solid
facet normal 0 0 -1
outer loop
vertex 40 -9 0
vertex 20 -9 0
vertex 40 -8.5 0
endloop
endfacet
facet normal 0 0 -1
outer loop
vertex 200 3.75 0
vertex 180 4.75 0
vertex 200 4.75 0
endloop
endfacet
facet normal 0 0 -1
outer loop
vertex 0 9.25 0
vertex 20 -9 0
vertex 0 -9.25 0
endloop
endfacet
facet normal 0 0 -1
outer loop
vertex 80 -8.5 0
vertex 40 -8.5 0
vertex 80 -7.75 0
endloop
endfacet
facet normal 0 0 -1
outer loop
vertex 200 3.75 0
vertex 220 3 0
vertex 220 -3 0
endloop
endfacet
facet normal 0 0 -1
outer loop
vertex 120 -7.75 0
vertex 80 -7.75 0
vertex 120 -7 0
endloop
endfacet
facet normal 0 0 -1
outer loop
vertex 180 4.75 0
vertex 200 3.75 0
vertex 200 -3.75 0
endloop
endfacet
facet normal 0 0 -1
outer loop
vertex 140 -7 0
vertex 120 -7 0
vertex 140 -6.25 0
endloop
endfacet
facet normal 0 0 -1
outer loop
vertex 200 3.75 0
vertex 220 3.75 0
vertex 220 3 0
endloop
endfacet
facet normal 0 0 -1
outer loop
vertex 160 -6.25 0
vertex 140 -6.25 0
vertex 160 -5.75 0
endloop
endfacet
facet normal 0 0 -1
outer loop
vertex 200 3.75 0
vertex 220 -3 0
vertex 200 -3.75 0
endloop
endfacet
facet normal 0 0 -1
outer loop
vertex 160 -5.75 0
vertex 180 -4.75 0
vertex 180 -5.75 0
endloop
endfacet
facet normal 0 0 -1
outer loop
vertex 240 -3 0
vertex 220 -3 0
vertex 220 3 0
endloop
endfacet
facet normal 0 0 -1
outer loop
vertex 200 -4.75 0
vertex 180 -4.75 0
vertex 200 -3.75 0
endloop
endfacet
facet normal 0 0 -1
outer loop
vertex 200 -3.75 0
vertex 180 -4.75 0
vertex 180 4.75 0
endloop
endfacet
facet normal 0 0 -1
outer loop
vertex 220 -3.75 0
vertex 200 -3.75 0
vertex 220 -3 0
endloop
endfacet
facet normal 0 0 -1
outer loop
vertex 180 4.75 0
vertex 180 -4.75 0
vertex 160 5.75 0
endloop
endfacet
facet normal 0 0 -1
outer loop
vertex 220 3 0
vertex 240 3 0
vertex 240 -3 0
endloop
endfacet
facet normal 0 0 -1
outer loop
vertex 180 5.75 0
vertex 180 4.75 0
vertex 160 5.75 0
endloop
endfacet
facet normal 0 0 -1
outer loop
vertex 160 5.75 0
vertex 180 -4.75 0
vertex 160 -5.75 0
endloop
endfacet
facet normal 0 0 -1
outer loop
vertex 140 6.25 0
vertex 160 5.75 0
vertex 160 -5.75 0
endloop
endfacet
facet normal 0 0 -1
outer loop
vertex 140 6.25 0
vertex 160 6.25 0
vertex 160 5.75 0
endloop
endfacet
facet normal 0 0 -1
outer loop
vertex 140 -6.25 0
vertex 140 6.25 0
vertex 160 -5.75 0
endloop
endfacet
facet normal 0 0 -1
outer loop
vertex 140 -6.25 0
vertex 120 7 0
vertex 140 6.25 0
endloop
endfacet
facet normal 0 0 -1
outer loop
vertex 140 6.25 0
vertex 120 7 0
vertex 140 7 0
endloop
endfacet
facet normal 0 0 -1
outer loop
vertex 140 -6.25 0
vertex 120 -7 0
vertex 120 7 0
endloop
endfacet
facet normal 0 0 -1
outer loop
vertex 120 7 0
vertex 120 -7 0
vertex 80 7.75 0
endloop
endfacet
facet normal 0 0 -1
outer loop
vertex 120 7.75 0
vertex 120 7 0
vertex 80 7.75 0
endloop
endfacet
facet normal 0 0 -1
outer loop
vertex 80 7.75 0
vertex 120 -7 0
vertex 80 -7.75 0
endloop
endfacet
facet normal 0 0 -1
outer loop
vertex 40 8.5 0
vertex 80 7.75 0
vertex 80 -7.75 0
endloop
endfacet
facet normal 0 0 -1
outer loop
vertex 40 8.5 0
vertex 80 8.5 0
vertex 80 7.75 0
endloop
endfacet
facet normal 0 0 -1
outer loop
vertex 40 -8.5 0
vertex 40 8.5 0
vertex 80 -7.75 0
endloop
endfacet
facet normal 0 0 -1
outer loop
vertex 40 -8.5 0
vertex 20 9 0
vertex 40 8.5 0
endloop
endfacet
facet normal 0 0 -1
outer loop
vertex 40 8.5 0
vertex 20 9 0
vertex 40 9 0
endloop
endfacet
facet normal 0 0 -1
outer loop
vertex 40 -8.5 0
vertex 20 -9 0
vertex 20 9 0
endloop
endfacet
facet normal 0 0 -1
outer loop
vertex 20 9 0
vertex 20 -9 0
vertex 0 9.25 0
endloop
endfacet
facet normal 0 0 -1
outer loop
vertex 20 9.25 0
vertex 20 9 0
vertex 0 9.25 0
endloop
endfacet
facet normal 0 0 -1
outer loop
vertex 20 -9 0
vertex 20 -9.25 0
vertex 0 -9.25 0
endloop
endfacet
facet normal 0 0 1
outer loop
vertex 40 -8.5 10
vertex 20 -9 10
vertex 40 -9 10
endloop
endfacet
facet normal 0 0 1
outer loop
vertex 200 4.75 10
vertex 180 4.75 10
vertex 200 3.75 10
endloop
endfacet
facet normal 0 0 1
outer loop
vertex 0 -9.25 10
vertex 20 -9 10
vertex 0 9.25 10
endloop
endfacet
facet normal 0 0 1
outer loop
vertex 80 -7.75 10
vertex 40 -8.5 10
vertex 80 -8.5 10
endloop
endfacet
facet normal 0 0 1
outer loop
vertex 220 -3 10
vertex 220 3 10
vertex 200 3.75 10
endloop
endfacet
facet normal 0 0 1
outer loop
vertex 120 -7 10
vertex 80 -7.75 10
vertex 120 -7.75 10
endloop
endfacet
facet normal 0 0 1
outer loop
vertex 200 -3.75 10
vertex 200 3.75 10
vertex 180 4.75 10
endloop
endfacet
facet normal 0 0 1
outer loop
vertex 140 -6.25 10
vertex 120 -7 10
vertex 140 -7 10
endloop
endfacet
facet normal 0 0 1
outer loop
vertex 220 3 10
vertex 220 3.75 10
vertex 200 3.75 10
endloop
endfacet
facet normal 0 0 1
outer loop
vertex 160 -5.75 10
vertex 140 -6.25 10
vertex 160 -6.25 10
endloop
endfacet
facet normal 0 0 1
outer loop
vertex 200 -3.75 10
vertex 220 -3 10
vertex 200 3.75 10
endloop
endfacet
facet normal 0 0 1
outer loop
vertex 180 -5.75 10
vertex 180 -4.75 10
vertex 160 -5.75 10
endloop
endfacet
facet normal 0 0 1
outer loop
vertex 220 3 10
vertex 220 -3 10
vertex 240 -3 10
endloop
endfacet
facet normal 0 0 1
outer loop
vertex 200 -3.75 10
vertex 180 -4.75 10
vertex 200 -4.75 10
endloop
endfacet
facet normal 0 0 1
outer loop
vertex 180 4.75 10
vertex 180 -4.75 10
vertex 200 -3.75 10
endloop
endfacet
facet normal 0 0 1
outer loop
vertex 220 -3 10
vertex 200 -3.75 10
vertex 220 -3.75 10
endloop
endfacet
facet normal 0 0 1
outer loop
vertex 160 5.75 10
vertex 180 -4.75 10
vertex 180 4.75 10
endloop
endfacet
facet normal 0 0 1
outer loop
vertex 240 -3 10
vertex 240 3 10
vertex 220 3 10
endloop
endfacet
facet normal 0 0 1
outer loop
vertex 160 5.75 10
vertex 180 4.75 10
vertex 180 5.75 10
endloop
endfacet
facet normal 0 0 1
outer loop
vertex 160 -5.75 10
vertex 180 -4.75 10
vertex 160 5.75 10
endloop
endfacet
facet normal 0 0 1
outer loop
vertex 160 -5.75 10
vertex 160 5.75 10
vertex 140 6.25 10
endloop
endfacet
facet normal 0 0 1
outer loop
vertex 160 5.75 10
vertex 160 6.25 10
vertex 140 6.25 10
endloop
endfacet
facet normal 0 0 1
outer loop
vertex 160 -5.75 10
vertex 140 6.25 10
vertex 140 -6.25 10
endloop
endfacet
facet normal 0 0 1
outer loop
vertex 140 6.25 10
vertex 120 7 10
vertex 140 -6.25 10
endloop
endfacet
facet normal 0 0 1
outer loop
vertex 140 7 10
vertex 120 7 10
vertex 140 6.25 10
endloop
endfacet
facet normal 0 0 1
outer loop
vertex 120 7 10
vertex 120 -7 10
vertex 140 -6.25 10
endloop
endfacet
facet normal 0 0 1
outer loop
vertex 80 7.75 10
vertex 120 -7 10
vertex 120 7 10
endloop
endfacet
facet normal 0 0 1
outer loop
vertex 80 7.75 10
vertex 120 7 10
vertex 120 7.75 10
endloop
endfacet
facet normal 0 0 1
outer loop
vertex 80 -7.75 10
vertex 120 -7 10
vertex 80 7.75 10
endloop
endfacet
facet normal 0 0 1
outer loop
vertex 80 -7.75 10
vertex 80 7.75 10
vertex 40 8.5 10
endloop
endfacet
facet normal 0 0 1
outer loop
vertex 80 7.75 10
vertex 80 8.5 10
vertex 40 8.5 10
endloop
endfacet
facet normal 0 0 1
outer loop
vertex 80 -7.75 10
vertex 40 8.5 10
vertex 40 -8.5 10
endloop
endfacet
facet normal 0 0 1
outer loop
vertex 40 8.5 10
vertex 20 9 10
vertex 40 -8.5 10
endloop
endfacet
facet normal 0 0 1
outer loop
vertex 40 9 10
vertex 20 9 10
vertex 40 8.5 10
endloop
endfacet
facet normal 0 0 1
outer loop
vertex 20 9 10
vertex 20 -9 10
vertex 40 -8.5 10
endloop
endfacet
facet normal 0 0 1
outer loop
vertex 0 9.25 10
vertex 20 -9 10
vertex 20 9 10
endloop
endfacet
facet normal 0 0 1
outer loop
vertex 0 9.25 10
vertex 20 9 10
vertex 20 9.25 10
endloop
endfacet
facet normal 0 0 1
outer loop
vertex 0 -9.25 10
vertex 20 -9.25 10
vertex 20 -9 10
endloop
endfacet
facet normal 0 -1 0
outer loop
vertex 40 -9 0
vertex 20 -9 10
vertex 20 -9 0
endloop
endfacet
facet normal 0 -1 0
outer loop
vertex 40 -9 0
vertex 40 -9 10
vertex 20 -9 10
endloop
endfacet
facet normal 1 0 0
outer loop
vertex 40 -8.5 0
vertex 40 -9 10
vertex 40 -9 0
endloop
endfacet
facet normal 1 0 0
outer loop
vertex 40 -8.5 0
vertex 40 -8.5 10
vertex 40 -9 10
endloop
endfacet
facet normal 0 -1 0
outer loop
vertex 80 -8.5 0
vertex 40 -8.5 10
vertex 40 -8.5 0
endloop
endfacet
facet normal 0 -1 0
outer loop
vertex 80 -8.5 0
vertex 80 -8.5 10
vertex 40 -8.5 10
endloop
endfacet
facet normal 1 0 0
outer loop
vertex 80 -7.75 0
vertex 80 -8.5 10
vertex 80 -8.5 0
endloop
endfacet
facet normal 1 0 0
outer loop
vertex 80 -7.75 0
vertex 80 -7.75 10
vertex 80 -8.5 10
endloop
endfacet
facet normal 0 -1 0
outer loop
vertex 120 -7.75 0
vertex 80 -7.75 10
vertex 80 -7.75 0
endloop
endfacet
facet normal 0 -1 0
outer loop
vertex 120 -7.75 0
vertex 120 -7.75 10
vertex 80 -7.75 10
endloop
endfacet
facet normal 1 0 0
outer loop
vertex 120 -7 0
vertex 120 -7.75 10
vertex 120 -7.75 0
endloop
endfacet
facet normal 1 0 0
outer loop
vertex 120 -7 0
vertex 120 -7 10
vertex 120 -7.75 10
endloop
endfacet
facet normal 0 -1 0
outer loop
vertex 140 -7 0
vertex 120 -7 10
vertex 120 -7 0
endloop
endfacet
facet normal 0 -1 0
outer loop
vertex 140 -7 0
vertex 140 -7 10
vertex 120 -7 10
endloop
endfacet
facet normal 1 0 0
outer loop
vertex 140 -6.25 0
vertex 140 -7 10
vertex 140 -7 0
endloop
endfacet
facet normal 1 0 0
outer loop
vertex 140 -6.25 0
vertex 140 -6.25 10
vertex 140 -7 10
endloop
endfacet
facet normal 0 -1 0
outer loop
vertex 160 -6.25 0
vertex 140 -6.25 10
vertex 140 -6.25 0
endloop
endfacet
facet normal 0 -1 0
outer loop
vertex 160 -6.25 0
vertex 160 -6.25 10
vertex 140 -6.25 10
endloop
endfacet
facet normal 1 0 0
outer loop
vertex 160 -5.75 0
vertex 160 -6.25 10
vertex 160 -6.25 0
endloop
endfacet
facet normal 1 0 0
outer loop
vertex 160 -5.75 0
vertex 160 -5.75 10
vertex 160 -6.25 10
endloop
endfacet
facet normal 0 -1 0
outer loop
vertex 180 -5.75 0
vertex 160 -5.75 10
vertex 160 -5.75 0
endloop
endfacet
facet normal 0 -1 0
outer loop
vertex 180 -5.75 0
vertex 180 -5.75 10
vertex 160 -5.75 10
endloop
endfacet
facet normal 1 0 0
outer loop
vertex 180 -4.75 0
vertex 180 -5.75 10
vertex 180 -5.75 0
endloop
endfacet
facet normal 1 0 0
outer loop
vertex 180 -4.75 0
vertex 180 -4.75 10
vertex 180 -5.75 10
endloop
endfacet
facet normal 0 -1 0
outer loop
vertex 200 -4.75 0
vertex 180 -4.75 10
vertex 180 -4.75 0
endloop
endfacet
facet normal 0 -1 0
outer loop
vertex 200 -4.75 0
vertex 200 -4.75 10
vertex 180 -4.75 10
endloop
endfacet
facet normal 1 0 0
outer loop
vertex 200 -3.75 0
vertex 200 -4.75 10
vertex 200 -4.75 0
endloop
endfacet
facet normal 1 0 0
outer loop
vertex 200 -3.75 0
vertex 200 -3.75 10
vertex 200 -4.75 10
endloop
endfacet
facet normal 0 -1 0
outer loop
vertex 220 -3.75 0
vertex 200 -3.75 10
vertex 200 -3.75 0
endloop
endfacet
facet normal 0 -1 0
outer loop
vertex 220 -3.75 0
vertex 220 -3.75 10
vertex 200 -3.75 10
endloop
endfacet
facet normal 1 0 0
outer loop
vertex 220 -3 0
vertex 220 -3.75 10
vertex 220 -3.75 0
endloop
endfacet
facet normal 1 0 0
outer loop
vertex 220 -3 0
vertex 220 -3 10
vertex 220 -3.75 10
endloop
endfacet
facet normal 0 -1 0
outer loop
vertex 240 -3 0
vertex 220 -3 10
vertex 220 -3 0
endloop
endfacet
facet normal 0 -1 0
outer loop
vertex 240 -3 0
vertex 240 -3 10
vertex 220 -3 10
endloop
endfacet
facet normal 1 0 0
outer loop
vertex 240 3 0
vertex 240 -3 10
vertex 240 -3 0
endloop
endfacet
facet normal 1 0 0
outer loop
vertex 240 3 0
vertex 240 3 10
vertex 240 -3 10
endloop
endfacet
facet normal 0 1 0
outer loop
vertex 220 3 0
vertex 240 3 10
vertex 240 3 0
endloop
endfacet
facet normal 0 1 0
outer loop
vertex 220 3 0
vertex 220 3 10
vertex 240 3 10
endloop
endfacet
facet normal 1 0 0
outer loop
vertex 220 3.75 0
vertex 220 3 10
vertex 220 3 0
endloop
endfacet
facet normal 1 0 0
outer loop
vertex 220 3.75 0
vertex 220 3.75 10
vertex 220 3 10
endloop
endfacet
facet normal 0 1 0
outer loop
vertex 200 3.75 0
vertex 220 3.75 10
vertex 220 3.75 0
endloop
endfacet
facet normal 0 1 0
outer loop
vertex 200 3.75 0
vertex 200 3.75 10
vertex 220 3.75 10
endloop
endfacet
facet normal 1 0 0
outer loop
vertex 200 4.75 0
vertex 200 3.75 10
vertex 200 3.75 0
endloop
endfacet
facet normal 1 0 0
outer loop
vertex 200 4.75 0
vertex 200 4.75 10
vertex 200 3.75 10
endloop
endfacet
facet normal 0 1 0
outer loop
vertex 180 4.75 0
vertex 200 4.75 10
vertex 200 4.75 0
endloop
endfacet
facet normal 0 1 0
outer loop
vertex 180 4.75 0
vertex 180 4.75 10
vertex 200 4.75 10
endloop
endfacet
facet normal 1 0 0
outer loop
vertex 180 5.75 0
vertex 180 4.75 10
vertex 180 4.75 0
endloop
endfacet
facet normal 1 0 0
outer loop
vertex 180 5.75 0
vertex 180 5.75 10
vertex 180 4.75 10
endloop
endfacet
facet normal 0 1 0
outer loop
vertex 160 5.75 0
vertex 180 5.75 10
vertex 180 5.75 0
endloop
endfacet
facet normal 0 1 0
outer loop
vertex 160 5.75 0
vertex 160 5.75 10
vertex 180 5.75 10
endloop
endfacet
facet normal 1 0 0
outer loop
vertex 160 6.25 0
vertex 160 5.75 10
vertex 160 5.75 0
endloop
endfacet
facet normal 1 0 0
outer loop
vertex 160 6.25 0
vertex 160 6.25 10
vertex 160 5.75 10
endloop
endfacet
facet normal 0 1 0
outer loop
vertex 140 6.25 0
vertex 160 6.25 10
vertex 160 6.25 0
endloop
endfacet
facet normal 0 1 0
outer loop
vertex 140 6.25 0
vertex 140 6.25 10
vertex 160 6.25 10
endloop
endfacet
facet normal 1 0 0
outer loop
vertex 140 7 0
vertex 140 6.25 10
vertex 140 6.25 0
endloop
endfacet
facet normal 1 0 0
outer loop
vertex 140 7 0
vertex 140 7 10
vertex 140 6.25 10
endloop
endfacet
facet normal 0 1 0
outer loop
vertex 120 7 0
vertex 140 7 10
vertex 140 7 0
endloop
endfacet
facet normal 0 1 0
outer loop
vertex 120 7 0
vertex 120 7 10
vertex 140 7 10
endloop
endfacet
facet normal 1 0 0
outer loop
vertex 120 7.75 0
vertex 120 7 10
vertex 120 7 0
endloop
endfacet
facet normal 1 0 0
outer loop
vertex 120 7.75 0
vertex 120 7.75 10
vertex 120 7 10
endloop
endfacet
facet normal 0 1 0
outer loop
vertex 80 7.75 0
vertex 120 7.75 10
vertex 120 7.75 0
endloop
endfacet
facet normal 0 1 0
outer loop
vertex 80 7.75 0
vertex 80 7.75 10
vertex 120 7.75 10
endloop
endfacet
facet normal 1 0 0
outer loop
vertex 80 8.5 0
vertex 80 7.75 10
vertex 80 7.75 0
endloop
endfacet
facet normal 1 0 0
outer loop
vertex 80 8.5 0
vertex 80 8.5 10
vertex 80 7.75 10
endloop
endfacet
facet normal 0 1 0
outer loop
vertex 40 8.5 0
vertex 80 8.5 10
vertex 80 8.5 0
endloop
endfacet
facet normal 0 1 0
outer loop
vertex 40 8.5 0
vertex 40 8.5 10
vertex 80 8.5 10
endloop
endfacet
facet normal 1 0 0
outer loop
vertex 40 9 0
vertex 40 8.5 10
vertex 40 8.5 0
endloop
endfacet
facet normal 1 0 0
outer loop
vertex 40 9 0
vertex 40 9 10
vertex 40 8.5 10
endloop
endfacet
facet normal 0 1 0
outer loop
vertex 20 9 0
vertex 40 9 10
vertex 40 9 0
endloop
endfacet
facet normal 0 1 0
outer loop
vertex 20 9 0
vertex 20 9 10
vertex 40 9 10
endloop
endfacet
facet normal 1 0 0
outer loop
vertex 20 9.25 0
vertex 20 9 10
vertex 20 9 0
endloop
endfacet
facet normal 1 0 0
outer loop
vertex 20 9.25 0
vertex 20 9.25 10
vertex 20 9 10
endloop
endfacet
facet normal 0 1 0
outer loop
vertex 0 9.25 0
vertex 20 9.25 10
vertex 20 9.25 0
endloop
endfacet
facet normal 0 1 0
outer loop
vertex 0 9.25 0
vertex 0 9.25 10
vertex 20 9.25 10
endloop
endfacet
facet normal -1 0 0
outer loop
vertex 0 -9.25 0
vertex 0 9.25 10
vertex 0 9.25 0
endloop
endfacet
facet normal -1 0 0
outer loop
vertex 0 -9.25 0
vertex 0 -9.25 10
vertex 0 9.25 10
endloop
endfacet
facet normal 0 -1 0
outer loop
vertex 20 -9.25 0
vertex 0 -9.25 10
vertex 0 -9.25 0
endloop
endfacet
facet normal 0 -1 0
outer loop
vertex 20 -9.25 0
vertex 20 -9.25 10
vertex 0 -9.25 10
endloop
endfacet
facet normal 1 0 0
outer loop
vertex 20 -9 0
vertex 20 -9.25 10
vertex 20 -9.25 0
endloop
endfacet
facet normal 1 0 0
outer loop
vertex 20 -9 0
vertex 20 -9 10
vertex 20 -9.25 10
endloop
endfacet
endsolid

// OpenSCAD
// Units: mm. Beam-model study only; physical/manufacturing validation pending.
linear_extrude(height=10)
polygon(points=[[0,-9.25],[20.0,-9.25],[20.0,-9.0],[40.0,-9.0],[40.0,-8.5],[60.0,-8.5],[80.0,-8.5],[80.0,-7.75],[100.0,-7.75],[120.0,-7.75],[120.0,-7.0],[140.0,-7.0],[140.0,-6.25],[160.0,-6.25],[160.0,-5.75],[180.0,-5.75],[180.0,-4.75],[200.0,-4.75],[200.0,-3.75],[220.0,-3.75],[220.0,-3.0],[240.0,-3.0],[240,3.0],[220.0,3.0],[220.0,3.75],[200.0,3.75],[200.0,4.75],[180.0,4.75],[180.0,5.75],[160.0,5.75],[160.0,6.25],[140.0,6.25],[140.0,7.0],[120.0,7.0],[120.0,7.75],[100.0,7.75],[80.0,7.75],[80.0,8.5],[60.0,8.5],[40.0,8.5],[40.0,9.0],[20.0,9.0],[20.0,9.25],[0.0,9.25]]);
